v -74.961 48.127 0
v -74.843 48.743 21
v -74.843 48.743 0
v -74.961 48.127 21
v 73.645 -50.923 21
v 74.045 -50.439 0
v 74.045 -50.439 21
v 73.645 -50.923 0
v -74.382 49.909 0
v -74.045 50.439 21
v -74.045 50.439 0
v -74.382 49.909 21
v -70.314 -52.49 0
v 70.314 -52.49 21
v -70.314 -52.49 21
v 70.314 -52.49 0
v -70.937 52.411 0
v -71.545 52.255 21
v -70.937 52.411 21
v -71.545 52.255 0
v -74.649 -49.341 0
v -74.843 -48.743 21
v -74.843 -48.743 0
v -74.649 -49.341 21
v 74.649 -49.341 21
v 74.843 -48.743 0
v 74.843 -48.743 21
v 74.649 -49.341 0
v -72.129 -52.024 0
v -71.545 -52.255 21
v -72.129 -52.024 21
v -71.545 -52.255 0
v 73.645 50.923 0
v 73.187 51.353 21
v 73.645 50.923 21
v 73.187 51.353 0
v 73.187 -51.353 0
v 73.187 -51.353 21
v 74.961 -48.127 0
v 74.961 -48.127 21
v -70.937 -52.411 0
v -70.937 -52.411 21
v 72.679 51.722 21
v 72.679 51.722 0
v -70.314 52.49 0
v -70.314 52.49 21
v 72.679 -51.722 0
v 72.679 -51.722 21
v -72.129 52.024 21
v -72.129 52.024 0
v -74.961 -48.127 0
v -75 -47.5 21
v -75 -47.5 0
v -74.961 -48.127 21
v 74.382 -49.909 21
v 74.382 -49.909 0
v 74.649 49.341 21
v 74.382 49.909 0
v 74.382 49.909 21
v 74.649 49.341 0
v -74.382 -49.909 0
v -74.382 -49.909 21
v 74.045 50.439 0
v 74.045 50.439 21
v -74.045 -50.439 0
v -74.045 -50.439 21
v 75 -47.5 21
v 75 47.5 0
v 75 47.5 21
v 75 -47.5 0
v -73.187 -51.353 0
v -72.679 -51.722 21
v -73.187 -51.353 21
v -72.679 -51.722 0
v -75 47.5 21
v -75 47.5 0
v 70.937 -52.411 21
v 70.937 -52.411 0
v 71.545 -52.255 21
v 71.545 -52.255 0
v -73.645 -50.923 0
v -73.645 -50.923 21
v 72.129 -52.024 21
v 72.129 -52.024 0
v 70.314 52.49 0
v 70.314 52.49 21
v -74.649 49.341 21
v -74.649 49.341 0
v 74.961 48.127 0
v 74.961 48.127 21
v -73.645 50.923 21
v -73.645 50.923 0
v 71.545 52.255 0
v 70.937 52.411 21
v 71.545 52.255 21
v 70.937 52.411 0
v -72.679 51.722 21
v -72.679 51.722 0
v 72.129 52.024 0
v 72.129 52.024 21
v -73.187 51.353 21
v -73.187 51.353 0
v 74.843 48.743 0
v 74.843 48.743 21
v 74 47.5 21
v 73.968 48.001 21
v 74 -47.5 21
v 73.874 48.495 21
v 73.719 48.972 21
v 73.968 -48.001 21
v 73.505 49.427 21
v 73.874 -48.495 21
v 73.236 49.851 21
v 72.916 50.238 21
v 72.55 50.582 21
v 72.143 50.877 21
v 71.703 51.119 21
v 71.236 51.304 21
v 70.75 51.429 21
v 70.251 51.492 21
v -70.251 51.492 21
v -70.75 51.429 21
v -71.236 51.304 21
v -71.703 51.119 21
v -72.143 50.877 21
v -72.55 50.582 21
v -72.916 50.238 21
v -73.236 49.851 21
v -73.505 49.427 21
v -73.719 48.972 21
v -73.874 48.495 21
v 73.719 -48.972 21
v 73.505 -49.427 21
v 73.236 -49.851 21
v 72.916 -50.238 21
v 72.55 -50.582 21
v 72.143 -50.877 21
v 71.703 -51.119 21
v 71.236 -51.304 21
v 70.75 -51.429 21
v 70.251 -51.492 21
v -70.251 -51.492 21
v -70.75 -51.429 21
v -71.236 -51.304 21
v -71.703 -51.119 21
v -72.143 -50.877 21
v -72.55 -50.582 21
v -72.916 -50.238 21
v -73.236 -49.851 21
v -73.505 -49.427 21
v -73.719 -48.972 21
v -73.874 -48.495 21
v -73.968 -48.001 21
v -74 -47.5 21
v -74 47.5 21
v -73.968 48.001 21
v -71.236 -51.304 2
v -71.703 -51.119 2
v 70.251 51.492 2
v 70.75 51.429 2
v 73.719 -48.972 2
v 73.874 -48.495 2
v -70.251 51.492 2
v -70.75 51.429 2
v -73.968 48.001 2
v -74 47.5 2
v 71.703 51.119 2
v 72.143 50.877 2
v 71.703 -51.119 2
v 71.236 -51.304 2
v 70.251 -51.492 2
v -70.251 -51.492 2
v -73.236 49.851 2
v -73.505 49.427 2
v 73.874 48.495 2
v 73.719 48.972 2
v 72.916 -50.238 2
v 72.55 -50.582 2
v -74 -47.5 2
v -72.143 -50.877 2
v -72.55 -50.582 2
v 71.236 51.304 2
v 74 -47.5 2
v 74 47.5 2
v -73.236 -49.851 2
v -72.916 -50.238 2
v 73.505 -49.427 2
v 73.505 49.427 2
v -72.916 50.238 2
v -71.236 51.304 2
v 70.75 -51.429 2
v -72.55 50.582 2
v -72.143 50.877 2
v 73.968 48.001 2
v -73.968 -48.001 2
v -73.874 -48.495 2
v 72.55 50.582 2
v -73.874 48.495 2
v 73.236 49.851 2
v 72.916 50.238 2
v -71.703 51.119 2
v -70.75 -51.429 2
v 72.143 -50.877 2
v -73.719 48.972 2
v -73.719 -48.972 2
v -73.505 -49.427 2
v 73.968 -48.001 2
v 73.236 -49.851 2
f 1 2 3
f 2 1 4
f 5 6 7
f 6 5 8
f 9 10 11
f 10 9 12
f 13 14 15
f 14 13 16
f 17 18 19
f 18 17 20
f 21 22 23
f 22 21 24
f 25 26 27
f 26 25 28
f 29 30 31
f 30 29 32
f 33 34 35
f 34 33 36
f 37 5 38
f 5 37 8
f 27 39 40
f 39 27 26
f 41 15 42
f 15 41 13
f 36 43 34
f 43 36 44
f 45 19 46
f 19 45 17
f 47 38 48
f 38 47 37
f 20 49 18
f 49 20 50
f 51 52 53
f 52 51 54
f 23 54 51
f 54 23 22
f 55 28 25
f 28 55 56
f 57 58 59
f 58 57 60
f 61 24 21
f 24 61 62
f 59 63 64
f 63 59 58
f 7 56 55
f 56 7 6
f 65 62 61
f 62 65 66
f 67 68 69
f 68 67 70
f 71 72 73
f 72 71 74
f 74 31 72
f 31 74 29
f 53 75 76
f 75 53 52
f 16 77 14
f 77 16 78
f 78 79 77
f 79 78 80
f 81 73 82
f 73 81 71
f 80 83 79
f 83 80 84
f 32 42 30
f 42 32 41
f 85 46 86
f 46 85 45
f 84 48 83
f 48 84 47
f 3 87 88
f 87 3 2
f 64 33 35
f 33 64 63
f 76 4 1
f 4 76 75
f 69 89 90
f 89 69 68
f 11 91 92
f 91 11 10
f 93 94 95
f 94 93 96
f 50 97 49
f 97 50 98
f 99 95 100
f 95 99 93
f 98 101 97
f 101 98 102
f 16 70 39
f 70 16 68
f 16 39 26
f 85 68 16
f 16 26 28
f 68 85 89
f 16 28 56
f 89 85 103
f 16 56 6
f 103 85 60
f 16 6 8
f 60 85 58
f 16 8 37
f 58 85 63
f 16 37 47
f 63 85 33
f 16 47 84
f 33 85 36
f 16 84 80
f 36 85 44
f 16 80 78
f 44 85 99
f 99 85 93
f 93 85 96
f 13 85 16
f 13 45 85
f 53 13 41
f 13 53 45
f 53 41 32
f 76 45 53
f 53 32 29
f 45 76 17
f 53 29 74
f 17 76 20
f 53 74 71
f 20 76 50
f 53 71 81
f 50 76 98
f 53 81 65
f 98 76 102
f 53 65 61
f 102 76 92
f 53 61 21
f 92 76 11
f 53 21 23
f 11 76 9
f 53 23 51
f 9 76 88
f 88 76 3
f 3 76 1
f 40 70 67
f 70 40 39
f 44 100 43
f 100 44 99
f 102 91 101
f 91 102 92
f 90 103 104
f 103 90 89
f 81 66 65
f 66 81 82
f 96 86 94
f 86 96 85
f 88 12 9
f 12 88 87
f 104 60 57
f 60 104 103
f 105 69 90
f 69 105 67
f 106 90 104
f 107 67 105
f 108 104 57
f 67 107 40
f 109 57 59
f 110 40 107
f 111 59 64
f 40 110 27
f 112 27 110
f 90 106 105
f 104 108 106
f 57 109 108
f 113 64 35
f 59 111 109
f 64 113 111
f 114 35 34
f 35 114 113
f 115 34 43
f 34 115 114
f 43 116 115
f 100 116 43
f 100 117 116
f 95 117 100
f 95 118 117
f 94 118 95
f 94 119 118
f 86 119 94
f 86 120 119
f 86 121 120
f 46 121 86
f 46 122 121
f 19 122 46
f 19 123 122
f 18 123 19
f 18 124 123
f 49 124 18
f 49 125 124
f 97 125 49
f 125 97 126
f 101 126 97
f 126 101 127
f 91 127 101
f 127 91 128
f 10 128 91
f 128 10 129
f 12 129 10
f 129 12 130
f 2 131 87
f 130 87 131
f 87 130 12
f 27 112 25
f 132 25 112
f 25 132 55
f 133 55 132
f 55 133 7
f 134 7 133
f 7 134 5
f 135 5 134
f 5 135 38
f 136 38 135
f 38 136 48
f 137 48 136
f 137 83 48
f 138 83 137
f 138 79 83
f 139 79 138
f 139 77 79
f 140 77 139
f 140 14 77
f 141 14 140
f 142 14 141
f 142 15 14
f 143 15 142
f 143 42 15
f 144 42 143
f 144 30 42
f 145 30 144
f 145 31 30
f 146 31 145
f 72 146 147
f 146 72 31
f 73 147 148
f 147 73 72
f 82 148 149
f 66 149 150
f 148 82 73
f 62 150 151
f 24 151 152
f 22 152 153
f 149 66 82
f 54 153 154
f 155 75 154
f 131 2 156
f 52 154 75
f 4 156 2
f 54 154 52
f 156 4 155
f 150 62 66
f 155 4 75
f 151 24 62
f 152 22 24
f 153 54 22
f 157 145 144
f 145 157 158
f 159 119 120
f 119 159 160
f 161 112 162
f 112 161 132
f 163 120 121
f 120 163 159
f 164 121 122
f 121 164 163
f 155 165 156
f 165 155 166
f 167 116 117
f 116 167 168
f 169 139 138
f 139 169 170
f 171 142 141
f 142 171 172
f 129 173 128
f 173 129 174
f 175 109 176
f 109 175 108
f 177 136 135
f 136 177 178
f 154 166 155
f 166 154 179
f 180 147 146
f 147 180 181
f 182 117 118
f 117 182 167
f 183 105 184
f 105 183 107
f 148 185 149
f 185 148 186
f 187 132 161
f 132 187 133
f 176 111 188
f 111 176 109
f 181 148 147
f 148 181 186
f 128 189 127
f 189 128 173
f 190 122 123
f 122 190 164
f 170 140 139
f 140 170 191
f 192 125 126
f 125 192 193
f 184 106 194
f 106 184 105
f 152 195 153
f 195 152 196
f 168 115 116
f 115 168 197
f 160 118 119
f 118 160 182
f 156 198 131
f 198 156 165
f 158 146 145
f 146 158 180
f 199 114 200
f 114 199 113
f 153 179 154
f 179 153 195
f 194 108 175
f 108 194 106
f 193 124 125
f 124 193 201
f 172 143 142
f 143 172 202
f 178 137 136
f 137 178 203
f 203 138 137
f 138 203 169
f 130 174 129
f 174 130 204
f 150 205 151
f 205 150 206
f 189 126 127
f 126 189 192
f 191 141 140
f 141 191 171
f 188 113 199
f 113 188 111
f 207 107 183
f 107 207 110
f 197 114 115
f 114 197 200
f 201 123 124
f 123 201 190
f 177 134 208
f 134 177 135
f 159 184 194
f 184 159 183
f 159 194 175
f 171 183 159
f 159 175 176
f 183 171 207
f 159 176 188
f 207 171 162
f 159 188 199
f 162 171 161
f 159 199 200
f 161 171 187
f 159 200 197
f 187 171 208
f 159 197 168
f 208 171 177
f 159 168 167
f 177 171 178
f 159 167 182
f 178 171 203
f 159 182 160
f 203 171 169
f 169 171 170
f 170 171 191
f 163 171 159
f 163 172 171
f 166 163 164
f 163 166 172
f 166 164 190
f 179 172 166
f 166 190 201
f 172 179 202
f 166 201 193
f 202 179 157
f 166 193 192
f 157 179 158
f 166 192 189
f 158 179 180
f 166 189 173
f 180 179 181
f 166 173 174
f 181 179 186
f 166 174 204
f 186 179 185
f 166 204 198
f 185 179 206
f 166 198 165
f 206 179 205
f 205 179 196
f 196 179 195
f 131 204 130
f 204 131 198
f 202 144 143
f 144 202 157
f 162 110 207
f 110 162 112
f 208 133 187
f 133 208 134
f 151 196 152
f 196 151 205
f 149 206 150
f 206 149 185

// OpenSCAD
$fn = 50;


difference() {
	union() {
		hull() {
			translate(v = [-70.0000000000, 47.5000000000, 0]) {
				cylinder(h = 21, r = 5);
			}
			translate(v = [70.0000000000, 47.5000000000, 0]) {
				cylinder(h = 21, r = 5);
			}
			translate(v = [-70.0000000000, -47.5000000000, 0]) {
				cylinder(h = 21, r = 5);
			}
			translate(v = [70.0000000000, -47.5000000000, 0]) {
				cylinder(h = 21, r = 5);
			}
		}
	}
	union() {
		translate(v = [0, 0, 2]) {
			hull() {
				translate(v = [-70.0000000000, 47.5000000000, 0]) {
					cylinder(h = 19, r = 4);
				}
				translate(v = [70.0000000000, 47.5000000000, 0]) {
					cylinder(h = 19, r = 4);
				}
				translate(v = [-70.0000000000, -47.5000000000, 0]) {
					cylinder(h = 19, r = 4);
				}
				translate(v = [70.0000000000, -47.5000000000, 0]) {
					cylinder(h = 19, r = 4);
				}
			}
		}
	}
}
